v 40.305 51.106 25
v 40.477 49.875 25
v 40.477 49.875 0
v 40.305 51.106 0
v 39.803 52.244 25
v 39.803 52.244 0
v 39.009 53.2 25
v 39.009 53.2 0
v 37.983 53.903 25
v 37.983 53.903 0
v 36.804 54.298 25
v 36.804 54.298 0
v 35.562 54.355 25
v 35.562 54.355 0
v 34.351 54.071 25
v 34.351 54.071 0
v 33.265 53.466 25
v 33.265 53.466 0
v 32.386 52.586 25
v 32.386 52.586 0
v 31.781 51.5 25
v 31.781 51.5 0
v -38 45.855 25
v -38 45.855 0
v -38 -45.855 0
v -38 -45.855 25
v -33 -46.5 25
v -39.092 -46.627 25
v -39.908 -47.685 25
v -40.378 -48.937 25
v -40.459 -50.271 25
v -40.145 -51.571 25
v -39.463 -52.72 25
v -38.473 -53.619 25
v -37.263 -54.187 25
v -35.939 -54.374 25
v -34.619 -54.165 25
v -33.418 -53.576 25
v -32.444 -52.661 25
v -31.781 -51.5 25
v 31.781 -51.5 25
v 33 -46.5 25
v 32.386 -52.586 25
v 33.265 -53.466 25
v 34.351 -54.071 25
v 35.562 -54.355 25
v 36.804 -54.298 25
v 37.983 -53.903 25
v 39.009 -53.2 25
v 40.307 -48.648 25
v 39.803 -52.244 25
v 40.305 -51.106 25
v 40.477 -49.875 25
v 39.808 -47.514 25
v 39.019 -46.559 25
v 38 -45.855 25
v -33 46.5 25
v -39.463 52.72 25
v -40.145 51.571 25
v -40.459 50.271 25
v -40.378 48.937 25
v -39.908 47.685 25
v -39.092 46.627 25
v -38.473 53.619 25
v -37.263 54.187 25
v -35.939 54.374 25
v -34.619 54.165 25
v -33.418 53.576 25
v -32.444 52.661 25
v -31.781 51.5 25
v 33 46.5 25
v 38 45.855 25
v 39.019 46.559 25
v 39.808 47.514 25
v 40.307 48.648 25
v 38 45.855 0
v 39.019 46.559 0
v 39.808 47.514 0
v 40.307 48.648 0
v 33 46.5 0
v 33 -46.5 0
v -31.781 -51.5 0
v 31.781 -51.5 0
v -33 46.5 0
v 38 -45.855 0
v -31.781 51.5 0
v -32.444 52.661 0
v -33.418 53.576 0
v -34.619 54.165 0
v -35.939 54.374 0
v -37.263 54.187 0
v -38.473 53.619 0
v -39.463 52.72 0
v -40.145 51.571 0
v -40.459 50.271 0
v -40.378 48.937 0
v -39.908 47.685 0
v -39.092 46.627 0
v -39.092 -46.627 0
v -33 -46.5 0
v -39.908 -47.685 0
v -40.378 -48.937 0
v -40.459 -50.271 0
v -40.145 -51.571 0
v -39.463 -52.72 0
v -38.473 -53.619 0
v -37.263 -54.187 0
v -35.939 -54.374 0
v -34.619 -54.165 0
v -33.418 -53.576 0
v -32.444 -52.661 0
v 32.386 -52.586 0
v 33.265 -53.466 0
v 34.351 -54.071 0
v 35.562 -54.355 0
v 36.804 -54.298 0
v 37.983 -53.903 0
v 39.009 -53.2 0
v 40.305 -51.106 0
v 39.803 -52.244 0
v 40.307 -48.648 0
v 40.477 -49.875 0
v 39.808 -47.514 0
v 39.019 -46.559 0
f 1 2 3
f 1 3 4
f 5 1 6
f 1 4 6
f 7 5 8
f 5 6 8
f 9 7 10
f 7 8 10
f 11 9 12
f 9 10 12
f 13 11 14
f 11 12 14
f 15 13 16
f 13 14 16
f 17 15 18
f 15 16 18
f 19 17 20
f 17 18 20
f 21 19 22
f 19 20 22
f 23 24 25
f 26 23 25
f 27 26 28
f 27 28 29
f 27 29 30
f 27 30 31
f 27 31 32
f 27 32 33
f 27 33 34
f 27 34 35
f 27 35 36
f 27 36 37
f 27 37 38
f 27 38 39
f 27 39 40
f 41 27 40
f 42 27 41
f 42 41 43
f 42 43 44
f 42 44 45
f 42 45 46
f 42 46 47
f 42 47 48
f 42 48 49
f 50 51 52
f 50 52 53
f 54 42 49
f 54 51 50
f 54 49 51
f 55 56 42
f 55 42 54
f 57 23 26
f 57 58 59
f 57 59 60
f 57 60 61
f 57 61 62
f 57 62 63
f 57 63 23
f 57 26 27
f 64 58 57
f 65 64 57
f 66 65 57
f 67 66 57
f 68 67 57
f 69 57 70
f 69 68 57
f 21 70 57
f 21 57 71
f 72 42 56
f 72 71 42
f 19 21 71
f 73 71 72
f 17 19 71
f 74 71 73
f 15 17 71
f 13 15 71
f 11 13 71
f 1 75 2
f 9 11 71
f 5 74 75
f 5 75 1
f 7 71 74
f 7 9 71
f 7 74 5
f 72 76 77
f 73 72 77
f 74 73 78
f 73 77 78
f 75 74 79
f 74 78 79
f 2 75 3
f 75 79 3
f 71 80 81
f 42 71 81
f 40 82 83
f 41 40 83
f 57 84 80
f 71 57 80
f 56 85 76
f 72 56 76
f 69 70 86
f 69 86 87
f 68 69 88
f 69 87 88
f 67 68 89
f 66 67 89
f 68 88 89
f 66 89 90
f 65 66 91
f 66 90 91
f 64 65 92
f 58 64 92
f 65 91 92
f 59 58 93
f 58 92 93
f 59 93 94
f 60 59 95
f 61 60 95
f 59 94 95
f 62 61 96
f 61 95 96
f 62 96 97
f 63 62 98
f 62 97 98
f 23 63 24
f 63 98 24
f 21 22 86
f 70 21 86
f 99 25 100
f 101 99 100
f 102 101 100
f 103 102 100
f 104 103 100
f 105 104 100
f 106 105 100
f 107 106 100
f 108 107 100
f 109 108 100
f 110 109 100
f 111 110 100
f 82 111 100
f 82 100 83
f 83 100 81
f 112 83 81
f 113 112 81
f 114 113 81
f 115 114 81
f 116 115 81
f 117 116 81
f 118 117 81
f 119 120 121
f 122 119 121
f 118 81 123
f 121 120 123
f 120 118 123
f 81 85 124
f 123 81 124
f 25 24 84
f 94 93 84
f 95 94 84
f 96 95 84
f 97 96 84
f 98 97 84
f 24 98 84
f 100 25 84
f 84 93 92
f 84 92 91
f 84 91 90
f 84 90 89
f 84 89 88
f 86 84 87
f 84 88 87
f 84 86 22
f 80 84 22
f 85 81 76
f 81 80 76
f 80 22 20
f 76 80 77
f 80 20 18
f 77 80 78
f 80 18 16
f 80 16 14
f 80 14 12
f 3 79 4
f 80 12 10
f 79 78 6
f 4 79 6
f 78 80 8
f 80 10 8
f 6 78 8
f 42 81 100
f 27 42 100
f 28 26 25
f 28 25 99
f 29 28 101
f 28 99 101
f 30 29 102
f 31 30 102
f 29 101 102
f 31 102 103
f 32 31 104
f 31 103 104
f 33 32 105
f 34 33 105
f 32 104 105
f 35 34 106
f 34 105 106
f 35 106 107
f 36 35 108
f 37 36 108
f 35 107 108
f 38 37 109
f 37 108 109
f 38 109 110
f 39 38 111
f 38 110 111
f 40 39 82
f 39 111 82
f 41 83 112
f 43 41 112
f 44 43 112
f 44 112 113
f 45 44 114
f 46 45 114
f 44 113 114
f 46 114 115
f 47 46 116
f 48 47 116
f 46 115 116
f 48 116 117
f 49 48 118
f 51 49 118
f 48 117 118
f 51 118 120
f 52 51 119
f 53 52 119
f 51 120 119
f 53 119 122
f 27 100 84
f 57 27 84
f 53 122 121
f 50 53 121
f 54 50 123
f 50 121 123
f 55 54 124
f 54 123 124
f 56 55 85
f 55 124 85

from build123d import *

# Parameters (mm, degrees)
F1_DEPTH = 25


with BuildPart() as f1:
    # F0 (on Top) → F1 (new body)
    with BuildSketch(Plane.XY):
        with BuildLine():
            ThreePointArc((-31.476978, 49.874552), (-31.875369, 48.02339), (-33, 46.5))
            Line((-33, 46.5), (33, 46.5))
            ThreePointArc((33, 46.5), (31.605074, 48.808506), (31.780799, 51.5))
            Line((31.780799, 51.5), (-31.780799, 51.5))
            ThreePointArc((-31.780799, 51.5), (-31.553586, 50.701351), (-31.476978, 49.874552))
        make_face()
        with BuildLine():
            ThreePointArc((-38, 45.854927), (-35.401185, 45.411541), (-33, 46.5))
            ThreePointArc((-33, 46.5), (-31.875369, 48.02339), (-31.476978, 49.874552))
            ThreePointArc((-31.476978, 49.874552), (-31.553586, 50.701351), (-31.780799, 51.5))
            Line((-31.780799, 51.5), (-38, 51.5))
            Line((-38, 51.5), (-38, 45.854927))
        make_face()
        with BuildLine():
            ThreePointArc((-31.780799, 51.5), (-39.00144, 53.206613), (-38, 45.854927))
            Line((-38, 45.854927), (-38, 51.5))
            Line((-38, 51.5), (-31.780799, 51.5))
        make_face()
        with BuildLine():
            Line((-33, -46.5), (-33, 46.5))
            ThreePointArc((-33, 46.5), (-35.401185, 45.411541), (-38, 45.854927))
            Line((-38, 45.854927), (-38, -45.854927))
            ThreePointArc((-38, -45.854927), (-35.401185, -45.411541), (-33, -46.5))
        make_face()
        with BuildLine():
            ThreePointArc((40.476978, 49.874552), (36.803778, 54.297944), (31.780799, 51.5))
            Line((31.780799, 51.5), (38, 51.5))
            Line((38, 51.5), (38, 45.854927))
            ThreePointArc((38, 45.854927), (39.808009, 47.513789), (40.476978, 49.874552))
        make_face()
        with BuildLine():
            ThreePointArc((31.780799, 51.5), (31.605074, 48.808506), (33, 46.5))
            ThreePointArc((33, 46.5), (35.401185, 45.411541), (38, 45.854927))
            Line((38, 45.854927), (38, 51.5))
            Line((38, 51.5), (31.780799, 51.5))
        make_face()
        with BuildLine():
            ThreePointArc((38, 45.854927), (35.401185, 45.411541), (33, 46.5))
            Line((33, 46.5), (33, -46.5))
            ThreePointArc((33, -46.5), (35.401185, -45.411541), (38, -45.854927))
            Line((38, -45.854927), (38, 45.854927))
        make_face()
        with BuildLine():
            ThreePointArc((40.476978, -49.874552), (39.808009, -47.513789), (38, -45.854927))
            Line((38, -45.854927), (38, -51.5))
            Line((38, -51.5), (31.780799, -51.5))
            ThreePointArc((31.780799, -51.5), (36.803778, -54.297944), (40.476978, -49.874552))
        make_face()
        with BuildLine():
            ThreePointArc((38, -45.854927), (35.401185, -45.411541), (33, -46.5))
            ThreePointArc((33, -46.5), (31.605074, -48.808506), (31.780799, -51.5))
            Line((31.780799, -51.5), (38, -51.5))
            Line((38, -51.5), (38, -45.854927))
        make_face()
        with BuildLine():
            Line((33, -46.5), (-33, -46.5))
            ThreePointArc((-33, -46.5), (-31.875369, -48.02339), (-31.476978, -49.874552))
            ThreePointArc((-31.476978, -49.874552), (-31.553586, -50.701351), (-31.780799, -51.5))
            Line((-31.780799, -51.5), (31.780799, -51.5))
            ThreePointArc((31.780799, -51.5), (31.605074, -48.808506), (33, -46.5))
        make_face()
        with BuildLine():
            ThreePointArc((-31.476978, -49.874552), (-31.875369, -48.02339), (-33, -46.5))
            ThreePointArc((-33, -46.5), (-35.401185, -45.411541), (-38, -45.854927))
            Line((-38, -45.854927), (-38, -51.5))
            Line((-38, -51.5), (-31.780799, -51.5))
            ThreePointArc((-31.780799, -51.5), (-31.553586, -50.701351), (-31.476978, -49.874552))
        make_face()
        with BuildLine():
            Line((-38, -51.5), (-38, -45.854927))
            ThreePointArc((-38, -45.854927), (-39.00144, -53.206613), (-31.780799, -51.5))
            Line((-31.780799, -51.5), (-38, -51.5))
        make_face()
    extrude(amount=F1_DEPTH)


solid = f1.part
